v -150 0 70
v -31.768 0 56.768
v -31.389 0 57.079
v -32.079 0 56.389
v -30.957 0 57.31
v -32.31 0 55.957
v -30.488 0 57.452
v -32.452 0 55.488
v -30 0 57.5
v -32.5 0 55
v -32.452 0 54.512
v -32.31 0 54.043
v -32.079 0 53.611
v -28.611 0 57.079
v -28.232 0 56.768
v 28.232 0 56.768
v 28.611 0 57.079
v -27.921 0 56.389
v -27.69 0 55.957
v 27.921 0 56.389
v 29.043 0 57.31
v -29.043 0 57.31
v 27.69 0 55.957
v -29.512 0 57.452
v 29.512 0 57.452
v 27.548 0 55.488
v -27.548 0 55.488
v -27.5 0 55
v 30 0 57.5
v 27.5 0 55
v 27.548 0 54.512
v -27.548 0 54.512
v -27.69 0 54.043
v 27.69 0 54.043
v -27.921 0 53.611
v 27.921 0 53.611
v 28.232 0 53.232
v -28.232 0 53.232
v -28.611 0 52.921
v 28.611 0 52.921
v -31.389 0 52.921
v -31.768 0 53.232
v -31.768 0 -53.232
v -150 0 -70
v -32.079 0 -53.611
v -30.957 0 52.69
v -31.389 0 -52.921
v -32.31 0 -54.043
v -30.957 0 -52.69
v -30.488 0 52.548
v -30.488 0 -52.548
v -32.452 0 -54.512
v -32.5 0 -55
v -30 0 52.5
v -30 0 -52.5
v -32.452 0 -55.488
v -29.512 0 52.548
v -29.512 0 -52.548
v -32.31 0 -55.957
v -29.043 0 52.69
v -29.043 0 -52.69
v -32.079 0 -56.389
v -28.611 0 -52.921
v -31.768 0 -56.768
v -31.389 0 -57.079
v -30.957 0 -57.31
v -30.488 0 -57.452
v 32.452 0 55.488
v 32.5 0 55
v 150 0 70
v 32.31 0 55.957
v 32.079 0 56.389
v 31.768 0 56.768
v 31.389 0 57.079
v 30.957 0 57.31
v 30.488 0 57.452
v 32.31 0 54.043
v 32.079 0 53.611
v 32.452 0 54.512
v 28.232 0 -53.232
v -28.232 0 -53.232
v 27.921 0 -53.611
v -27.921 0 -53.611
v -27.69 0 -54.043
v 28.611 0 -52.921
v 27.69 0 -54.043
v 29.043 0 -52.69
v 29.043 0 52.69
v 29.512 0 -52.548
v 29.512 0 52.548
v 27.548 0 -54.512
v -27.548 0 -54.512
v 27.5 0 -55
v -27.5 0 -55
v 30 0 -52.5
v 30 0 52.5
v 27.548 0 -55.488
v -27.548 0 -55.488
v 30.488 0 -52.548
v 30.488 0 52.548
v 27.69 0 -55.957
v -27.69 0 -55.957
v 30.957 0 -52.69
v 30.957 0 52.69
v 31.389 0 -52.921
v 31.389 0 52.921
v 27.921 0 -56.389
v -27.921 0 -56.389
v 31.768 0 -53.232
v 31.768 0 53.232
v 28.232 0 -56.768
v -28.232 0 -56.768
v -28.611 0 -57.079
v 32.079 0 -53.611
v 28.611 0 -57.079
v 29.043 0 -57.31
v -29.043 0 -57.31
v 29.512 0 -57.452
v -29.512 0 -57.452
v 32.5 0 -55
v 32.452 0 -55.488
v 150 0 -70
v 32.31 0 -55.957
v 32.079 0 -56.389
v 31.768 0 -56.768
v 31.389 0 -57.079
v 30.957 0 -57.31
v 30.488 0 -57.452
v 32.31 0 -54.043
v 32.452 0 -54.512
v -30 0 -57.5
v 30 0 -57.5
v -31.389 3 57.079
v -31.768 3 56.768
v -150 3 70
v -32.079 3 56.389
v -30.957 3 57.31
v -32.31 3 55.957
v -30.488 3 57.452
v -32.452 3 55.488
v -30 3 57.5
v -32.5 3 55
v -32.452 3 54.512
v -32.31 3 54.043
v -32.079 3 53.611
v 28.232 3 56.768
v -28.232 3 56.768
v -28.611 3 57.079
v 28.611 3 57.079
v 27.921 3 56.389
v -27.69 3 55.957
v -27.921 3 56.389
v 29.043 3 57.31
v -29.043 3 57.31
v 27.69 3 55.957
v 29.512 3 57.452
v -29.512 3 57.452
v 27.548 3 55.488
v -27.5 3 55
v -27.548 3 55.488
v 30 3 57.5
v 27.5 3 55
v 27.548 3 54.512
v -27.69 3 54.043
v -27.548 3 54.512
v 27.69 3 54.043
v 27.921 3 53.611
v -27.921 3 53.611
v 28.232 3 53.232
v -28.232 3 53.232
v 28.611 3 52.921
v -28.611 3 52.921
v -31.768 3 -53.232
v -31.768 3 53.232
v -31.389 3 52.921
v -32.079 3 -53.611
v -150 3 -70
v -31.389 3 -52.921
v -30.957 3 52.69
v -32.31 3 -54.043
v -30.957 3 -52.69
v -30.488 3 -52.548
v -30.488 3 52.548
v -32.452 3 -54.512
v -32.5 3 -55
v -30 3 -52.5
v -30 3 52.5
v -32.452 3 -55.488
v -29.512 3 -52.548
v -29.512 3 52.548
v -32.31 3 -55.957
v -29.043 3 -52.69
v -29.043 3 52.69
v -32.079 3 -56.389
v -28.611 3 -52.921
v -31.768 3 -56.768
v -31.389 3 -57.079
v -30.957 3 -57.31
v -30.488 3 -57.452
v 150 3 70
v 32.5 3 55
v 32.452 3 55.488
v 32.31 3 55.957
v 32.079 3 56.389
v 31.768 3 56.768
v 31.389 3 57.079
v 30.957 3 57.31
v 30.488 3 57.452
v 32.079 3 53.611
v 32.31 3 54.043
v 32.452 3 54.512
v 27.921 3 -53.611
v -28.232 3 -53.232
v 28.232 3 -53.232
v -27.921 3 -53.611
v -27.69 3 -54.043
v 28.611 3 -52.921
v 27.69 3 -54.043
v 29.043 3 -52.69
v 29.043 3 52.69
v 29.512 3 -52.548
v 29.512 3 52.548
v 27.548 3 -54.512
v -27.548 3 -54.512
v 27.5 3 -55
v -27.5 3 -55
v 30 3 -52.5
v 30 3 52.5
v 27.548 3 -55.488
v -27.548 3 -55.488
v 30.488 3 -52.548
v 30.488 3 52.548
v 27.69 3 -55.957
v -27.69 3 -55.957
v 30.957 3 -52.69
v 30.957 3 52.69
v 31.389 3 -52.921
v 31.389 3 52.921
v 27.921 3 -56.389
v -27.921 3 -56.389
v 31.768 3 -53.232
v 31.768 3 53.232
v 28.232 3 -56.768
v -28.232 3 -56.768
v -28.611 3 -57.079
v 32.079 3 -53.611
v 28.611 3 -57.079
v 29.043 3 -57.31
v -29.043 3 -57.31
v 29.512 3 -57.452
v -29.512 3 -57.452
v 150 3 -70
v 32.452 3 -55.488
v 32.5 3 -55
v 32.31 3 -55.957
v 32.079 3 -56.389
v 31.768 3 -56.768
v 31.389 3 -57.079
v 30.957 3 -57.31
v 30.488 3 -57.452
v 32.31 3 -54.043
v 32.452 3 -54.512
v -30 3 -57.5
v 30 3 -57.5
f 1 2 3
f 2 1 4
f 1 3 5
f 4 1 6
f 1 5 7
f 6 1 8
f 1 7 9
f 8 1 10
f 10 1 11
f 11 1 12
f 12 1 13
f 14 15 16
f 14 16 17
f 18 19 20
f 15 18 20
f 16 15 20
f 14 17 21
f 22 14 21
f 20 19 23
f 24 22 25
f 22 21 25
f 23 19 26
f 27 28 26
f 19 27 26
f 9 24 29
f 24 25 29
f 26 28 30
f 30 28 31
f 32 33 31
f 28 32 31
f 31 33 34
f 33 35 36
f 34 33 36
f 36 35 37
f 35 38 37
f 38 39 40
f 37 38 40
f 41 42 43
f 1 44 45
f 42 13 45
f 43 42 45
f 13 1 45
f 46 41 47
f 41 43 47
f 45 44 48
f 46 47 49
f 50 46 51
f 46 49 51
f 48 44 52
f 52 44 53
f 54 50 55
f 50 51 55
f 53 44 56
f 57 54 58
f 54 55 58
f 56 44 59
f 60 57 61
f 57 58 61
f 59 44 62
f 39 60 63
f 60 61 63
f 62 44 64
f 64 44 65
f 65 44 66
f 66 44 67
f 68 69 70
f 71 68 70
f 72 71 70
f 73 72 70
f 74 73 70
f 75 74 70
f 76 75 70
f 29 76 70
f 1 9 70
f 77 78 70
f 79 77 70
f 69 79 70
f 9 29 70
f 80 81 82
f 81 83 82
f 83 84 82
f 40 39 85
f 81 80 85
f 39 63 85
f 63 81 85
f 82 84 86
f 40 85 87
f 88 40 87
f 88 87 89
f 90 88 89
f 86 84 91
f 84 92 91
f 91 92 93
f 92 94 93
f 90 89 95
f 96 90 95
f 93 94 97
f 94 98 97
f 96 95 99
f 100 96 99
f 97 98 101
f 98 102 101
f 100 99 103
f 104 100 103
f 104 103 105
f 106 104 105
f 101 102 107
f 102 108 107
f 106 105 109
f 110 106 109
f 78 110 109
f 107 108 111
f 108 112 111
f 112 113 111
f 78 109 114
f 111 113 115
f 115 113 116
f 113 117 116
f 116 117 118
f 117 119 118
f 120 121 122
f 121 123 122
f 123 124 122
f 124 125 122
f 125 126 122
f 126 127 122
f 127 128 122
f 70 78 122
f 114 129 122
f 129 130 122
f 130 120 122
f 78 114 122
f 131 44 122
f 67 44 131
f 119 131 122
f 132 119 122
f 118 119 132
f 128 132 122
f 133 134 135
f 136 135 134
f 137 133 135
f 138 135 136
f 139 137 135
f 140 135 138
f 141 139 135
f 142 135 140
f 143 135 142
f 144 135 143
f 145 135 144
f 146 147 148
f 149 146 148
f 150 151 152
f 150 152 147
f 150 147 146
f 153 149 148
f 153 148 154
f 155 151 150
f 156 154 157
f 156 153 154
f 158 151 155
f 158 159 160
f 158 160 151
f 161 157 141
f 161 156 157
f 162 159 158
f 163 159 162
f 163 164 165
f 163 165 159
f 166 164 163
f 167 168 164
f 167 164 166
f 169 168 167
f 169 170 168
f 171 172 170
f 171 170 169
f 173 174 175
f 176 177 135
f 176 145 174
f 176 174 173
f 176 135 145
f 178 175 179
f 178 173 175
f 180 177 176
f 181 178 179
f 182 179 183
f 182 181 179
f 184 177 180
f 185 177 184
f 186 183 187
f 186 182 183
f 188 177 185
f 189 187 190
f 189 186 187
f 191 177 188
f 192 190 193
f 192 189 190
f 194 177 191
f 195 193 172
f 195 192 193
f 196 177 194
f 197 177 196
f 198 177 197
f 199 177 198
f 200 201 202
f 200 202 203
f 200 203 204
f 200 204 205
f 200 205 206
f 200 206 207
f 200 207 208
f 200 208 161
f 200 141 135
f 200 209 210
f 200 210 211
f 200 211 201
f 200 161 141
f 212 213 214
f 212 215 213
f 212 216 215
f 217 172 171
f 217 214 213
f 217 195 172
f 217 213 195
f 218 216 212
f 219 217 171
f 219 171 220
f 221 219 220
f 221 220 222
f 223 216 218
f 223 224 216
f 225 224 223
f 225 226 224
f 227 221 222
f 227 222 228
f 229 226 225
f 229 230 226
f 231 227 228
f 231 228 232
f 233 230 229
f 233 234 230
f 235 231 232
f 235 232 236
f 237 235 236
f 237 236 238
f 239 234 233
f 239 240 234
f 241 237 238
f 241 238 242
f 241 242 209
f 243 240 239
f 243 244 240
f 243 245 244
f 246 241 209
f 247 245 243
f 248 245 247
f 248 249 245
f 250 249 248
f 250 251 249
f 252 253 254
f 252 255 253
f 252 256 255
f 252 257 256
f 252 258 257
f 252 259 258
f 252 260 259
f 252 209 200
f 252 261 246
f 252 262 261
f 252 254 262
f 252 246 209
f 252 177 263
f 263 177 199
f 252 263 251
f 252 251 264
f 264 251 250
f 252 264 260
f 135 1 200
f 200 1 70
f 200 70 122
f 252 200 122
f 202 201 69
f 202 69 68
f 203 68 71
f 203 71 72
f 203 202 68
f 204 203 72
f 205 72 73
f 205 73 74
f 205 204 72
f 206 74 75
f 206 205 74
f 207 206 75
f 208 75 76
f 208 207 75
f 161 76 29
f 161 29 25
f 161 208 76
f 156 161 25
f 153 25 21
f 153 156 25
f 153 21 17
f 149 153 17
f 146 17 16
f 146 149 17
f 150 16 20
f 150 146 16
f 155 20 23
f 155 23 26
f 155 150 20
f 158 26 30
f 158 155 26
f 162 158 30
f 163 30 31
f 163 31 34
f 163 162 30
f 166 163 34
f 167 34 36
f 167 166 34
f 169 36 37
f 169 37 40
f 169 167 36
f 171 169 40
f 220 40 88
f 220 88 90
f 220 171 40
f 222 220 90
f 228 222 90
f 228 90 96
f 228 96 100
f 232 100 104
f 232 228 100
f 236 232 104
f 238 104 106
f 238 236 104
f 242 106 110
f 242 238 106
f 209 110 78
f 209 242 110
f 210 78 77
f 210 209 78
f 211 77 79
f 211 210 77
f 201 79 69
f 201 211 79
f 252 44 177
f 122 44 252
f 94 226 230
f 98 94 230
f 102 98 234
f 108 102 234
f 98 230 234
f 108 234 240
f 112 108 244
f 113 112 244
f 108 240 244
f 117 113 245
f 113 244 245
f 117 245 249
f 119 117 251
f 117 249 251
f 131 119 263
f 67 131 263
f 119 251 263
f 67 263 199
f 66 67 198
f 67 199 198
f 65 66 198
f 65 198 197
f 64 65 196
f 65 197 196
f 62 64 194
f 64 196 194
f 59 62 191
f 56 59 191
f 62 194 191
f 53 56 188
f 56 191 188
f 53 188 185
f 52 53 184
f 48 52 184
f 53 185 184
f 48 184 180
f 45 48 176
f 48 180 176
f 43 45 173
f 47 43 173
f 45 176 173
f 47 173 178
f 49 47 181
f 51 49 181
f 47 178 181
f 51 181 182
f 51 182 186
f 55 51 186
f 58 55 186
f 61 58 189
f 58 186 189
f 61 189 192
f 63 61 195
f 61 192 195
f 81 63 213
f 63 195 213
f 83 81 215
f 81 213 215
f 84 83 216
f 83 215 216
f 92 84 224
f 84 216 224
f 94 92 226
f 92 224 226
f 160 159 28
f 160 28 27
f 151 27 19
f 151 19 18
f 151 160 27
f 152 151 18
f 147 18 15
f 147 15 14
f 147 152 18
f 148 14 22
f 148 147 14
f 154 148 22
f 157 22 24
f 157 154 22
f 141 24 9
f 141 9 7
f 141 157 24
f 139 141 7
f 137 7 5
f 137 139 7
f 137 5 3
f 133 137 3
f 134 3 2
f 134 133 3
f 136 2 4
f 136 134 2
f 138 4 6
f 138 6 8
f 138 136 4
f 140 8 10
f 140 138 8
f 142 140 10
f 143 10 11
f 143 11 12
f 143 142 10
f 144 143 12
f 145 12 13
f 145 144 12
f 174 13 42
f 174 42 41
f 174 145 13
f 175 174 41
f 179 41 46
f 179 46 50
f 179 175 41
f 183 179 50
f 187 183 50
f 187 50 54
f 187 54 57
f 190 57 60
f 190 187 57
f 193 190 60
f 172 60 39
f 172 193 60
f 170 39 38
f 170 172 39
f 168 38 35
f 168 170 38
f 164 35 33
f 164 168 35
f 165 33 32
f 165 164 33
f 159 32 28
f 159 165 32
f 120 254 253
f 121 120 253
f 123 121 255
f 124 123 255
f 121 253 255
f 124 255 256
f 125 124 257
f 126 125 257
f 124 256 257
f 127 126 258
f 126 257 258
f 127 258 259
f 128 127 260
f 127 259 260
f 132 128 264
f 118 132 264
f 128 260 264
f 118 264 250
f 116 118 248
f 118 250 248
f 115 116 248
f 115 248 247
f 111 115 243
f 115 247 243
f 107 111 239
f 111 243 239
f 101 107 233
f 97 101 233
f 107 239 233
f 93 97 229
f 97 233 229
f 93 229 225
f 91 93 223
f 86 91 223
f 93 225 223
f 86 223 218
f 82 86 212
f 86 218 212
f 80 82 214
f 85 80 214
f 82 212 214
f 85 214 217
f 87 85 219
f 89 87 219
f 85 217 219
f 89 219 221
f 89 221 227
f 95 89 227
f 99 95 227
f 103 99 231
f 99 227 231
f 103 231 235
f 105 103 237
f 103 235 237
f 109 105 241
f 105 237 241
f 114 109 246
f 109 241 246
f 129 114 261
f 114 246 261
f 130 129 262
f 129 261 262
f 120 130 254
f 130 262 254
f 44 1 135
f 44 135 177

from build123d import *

# Parameters (mm, degrees)
SKETCH_1_W          = 300
SKETCH_1_H          = 140
EXTRUDE_1_DEPTH     = 3
SKETCH_2_R          = 2.5
CUT_EXTRUDE_1_DEPTH = 3


with BuildPart() as part:
    # 草图1 → 凸台-拉伸1 (new body)
    with BuildSketch(Plane(origin=(0, 0, 0), x_dir=(1, 0, 0), z_dir=(0, 1, 0))):
        Rectangle(SKETCH_1_W, SKETCH_1_H)
    extrude(amount=EXTRUDE_1_DEPTH)

    # 草图2 → 切除-拉伸1 (cut)
    with BuildSketch(Plane(origin=(0, 3, 0), x_dir=(1, 0, 0), z_dir=(0, 1, 0))):
        with Locations((-30, 55)):
            Circle(SKETCH_2_R)
        with Locations((30, 55)):
            Circle(SKETCH_2_R)
    cut_extrude_1 = extrude(amount=-CUT_EXTRUDE_1_DEPTH, mode=Mode.SUBTRACT)

    # 镜向1: 切除-拉伸1 across plane
    add(cut_extrude_1.mirror(Plane.XY), mode=Mode.SUBTRACT)


solid = part.part
